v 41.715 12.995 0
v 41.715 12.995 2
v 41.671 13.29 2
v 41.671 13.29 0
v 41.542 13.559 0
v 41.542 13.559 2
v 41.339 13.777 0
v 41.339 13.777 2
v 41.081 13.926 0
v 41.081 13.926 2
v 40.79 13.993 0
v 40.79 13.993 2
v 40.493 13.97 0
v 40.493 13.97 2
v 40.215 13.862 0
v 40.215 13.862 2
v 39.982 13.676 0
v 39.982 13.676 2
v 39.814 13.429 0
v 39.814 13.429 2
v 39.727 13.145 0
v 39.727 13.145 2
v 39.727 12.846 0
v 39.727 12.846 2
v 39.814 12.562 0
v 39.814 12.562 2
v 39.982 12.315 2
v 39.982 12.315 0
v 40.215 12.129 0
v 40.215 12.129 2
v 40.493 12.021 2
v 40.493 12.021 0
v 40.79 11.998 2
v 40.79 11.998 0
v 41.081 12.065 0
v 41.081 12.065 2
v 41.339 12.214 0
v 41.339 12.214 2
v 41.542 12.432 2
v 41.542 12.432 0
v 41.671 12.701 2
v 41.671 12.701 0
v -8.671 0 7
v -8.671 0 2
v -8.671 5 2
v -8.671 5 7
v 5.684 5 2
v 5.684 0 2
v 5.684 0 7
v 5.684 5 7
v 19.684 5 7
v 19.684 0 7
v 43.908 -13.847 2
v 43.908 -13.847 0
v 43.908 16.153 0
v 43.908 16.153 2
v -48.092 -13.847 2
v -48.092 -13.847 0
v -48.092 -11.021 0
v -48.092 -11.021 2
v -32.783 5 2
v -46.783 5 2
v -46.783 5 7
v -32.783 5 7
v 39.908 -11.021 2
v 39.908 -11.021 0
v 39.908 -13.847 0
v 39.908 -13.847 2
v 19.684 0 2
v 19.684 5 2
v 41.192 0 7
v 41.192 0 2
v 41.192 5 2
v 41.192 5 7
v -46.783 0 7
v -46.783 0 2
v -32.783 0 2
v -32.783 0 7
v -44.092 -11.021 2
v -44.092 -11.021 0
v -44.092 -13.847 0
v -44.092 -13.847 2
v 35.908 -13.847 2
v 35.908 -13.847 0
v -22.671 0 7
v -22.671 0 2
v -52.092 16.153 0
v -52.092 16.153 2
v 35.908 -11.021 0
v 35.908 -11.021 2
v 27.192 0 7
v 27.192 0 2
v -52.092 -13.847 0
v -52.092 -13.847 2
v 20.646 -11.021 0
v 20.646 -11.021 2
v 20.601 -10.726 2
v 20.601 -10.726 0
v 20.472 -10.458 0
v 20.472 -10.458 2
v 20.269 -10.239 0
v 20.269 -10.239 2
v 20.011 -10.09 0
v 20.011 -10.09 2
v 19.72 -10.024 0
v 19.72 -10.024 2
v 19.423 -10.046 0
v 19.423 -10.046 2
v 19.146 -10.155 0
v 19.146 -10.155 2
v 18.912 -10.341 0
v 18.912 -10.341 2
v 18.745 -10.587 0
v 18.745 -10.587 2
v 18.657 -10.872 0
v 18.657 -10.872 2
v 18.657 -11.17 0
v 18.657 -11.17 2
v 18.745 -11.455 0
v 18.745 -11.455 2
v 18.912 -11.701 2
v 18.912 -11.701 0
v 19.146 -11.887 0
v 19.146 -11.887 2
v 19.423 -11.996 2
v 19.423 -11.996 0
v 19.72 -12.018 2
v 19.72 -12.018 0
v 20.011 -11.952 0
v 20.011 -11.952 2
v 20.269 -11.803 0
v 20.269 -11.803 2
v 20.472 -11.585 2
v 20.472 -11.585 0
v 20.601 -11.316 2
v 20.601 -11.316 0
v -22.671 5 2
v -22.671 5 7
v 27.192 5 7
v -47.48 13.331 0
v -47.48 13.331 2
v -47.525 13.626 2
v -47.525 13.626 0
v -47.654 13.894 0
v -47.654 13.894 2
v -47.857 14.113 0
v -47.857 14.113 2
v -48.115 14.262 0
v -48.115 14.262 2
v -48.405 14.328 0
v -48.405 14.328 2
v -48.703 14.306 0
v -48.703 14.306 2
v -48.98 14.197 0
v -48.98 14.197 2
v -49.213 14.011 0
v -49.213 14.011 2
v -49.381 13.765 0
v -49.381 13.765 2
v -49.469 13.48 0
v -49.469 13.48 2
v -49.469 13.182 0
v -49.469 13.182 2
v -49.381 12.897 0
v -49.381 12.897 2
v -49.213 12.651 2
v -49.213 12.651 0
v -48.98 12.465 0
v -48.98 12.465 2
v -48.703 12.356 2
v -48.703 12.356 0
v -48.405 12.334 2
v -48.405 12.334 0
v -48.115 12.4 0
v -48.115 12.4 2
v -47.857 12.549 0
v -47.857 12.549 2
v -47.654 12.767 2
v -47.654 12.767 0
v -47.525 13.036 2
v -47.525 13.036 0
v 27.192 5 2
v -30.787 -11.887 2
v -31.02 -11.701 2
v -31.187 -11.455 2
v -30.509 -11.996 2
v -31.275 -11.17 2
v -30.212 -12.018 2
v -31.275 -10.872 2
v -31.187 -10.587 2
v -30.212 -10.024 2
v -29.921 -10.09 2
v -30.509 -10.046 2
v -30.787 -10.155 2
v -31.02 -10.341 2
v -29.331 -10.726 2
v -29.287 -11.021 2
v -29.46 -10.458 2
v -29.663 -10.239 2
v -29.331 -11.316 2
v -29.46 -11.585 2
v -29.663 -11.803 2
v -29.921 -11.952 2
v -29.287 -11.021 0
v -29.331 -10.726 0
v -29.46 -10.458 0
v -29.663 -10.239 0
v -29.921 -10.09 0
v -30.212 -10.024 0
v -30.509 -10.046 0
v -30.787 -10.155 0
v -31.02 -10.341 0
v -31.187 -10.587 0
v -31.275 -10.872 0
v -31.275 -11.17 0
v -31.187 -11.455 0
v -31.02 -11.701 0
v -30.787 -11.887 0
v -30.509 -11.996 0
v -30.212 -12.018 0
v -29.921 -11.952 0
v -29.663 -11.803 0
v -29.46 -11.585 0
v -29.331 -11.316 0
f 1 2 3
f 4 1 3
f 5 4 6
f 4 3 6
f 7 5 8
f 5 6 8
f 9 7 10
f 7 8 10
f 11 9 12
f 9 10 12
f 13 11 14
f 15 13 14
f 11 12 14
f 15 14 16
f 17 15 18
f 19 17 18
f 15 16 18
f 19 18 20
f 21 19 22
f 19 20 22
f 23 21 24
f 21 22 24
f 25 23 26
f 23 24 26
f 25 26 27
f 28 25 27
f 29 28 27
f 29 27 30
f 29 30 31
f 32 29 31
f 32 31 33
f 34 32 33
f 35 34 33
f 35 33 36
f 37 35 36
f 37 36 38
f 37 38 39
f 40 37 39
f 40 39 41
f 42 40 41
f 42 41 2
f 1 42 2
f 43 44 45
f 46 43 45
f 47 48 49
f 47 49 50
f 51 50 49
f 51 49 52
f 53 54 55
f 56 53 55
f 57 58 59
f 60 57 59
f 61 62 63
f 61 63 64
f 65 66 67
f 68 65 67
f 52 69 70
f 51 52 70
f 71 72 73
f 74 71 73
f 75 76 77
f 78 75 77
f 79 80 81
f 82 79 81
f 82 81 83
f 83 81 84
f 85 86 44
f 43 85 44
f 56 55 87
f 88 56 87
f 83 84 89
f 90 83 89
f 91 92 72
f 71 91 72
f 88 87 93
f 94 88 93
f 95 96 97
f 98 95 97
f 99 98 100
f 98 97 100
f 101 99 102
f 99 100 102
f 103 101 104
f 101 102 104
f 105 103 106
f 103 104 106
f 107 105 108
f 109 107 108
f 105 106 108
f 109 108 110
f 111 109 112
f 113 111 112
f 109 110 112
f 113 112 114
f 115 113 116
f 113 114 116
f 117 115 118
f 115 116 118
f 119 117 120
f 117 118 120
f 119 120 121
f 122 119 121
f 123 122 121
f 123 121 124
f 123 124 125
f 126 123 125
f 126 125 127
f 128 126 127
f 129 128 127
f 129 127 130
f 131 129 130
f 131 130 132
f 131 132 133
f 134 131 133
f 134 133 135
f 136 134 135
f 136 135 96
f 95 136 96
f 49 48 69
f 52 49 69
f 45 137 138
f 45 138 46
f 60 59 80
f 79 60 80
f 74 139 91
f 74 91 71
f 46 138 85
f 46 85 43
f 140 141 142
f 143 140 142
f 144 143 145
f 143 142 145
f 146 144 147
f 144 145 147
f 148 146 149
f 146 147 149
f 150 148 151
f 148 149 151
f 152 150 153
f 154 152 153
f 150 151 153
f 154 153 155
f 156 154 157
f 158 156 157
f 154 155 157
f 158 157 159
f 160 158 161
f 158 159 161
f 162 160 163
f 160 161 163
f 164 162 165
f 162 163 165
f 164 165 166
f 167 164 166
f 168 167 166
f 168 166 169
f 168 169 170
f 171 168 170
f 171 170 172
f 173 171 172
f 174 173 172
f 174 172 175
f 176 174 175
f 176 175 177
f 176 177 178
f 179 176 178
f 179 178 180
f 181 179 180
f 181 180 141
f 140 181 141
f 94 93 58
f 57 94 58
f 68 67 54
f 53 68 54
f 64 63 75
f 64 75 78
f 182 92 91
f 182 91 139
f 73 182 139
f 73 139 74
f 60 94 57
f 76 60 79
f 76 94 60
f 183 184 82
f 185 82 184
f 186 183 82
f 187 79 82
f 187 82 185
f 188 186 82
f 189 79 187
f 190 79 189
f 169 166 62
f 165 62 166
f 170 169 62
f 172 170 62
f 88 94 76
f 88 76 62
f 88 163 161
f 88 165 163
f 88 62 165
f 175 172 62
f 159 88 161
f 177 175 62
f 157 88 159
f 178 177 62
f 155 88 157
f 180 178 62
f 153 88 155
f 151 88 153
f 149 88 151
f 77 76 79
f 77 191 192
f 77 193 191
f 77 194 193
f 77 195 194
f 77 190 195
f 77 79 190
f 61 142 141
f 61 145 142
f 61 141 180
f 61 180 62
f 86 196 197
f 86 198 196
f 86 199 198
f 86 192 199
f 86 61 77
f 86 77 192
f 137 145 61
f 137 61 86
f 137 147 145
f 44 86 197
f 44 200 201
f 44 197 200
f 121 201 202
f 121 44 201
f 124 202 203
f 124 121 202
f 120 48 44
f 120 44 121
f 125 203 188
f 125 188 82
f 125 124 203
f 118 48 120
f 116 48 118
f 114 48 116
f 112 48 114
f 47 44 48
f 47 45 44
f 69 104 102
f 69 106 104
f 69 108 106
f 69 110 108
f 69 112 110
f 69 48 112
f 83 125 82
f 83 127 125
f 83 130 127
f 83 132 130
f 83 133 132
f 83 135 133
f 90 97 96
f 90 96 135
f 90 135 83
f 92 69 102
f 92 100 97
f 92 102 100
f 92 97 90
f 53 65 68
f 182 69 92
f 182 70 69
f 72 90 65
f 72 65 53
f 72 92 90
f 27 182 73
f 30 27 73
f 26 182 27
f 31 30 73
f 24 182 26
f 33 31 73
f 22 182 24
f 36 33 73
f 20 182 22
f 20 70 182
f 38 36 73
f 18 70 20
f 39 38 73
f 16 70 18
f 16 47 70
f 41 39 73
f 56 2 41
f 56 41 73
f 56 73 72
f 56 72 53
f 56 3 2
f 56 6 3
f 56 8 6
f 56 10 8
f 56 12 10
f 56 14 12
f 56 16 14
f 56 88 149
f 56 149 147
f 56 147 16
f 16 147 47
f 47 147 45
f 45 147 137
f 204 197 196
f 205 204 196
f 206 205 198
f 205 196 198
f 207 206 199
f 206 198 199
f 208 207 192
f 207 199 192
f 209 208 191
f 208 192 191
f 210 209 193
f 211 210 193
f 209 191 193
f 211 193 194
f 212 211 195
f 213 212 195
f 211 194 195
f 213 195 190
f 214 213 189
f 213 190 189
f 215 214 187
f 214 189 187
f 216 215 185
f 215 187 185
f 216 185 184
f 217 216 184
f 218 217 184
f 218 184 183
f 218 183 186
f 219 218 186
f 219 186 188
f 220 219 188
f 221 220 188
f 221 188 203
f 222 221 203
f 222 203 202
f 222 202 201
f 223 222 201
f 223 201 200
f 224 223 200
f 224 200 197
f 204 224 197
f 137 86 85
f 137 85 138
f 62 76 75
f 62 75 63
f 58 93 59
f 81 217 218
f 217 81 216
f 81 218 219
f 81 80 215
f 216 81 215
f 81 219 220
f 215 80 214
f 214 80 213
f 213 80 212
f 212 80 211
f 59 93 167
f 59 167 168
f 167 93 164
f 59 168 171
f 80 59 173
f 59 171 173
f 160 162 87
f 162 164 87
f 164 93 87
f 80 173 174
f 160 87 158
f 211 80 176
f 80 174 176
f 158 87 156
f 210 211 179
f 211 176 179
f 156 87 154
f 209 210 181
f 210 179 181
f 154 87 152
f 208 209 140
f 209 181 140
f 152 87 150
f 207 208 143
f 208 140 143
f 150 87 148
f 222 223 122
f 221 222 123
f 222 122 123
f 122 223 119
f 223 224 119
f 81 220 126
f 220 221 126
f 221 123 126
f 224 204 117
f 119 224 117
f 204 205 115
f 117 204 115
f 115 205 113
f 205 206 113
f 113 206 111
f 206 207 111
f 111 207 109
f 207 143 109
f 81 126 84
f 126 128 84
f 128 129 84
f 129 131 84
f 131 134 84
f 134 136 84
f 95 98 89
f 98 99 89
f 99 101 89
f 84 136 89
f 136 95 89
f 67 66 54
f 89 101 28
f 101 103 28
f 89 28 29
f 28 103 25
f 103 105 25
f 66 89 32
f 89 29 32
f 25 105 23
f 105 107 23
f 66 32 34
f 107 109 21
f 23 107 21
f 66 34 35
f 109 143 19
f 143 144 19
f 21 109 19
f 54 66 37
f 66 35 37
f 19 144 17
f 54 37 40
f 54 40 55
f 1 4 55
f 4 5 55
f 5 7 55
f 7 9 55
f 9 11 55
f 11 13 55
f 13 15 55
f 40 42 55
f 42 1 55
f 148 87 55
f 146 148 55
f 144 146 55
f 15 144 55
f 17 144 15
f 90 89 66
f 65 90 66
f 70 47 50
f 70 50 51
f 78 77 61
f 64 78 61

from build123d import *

# Parameters (mm, degrees)
F1_DEPTH = 2
F2_W     = 14
F2_H     = 5
F3_DEPTH = 5
F4_R     = 1
F5_DEPTH = 25


with BuildPart() as f1:
    # F0 (on Top) → F1 (new body)
    with BuildSketch(Plane.XY):
        Polygon((43.908193, 16.15281), (-52.091807, 16.15281), (-52.091807, -13.84719), (-48.091807, -13.84719), (-48.091807, -11.021232), (-44.091807, -11.021232), (-44.091807, -13.84719), (35.908193, -13.84719), (35.908193, -11.021232), (39.908193, -11.021232), (39.908193, -13.84719), (43.908193, -13.84719), align=None)
    extrude(amount=F1_DEPTH)

    # F2 (on face) → F3 (join)
    with BuildSketch(Plane.XY.offset(2)):
        with Locations((-39.782549, 2.5)):
            Rectangle(F2_W, F2_H)
        with Locations((-15.670858, 2.5)):
            Rectangle(F2_W, F2_H)
        with Locations((12.684493, 2.5)):
            Rectangle(F2_W, F2_H)
        with Locations((34.192123, 2.5)):
            Rectangle(F2_W, F2_H)
    extrude(amount=F3_DEPTH)

    # F4 (on face) → F5 (cut)
    with BuildSketch(Plane.XY.offset(2)):
        with Locations((-48.480082, 13.330769)):
            Circle(F4_R)
        with Locations((40.715411, 12.995487)):
            Circle(F4_R)
        with Locations((19.645516, -11.021232)):
            Circle(F4_R)
        with Locations((-30.286502, -11.021232)):
            Circle(F4_R)
    extrude(amount=-F5_DEPTH, mode=Mode.SUBTRACT)


solid = f1.part
